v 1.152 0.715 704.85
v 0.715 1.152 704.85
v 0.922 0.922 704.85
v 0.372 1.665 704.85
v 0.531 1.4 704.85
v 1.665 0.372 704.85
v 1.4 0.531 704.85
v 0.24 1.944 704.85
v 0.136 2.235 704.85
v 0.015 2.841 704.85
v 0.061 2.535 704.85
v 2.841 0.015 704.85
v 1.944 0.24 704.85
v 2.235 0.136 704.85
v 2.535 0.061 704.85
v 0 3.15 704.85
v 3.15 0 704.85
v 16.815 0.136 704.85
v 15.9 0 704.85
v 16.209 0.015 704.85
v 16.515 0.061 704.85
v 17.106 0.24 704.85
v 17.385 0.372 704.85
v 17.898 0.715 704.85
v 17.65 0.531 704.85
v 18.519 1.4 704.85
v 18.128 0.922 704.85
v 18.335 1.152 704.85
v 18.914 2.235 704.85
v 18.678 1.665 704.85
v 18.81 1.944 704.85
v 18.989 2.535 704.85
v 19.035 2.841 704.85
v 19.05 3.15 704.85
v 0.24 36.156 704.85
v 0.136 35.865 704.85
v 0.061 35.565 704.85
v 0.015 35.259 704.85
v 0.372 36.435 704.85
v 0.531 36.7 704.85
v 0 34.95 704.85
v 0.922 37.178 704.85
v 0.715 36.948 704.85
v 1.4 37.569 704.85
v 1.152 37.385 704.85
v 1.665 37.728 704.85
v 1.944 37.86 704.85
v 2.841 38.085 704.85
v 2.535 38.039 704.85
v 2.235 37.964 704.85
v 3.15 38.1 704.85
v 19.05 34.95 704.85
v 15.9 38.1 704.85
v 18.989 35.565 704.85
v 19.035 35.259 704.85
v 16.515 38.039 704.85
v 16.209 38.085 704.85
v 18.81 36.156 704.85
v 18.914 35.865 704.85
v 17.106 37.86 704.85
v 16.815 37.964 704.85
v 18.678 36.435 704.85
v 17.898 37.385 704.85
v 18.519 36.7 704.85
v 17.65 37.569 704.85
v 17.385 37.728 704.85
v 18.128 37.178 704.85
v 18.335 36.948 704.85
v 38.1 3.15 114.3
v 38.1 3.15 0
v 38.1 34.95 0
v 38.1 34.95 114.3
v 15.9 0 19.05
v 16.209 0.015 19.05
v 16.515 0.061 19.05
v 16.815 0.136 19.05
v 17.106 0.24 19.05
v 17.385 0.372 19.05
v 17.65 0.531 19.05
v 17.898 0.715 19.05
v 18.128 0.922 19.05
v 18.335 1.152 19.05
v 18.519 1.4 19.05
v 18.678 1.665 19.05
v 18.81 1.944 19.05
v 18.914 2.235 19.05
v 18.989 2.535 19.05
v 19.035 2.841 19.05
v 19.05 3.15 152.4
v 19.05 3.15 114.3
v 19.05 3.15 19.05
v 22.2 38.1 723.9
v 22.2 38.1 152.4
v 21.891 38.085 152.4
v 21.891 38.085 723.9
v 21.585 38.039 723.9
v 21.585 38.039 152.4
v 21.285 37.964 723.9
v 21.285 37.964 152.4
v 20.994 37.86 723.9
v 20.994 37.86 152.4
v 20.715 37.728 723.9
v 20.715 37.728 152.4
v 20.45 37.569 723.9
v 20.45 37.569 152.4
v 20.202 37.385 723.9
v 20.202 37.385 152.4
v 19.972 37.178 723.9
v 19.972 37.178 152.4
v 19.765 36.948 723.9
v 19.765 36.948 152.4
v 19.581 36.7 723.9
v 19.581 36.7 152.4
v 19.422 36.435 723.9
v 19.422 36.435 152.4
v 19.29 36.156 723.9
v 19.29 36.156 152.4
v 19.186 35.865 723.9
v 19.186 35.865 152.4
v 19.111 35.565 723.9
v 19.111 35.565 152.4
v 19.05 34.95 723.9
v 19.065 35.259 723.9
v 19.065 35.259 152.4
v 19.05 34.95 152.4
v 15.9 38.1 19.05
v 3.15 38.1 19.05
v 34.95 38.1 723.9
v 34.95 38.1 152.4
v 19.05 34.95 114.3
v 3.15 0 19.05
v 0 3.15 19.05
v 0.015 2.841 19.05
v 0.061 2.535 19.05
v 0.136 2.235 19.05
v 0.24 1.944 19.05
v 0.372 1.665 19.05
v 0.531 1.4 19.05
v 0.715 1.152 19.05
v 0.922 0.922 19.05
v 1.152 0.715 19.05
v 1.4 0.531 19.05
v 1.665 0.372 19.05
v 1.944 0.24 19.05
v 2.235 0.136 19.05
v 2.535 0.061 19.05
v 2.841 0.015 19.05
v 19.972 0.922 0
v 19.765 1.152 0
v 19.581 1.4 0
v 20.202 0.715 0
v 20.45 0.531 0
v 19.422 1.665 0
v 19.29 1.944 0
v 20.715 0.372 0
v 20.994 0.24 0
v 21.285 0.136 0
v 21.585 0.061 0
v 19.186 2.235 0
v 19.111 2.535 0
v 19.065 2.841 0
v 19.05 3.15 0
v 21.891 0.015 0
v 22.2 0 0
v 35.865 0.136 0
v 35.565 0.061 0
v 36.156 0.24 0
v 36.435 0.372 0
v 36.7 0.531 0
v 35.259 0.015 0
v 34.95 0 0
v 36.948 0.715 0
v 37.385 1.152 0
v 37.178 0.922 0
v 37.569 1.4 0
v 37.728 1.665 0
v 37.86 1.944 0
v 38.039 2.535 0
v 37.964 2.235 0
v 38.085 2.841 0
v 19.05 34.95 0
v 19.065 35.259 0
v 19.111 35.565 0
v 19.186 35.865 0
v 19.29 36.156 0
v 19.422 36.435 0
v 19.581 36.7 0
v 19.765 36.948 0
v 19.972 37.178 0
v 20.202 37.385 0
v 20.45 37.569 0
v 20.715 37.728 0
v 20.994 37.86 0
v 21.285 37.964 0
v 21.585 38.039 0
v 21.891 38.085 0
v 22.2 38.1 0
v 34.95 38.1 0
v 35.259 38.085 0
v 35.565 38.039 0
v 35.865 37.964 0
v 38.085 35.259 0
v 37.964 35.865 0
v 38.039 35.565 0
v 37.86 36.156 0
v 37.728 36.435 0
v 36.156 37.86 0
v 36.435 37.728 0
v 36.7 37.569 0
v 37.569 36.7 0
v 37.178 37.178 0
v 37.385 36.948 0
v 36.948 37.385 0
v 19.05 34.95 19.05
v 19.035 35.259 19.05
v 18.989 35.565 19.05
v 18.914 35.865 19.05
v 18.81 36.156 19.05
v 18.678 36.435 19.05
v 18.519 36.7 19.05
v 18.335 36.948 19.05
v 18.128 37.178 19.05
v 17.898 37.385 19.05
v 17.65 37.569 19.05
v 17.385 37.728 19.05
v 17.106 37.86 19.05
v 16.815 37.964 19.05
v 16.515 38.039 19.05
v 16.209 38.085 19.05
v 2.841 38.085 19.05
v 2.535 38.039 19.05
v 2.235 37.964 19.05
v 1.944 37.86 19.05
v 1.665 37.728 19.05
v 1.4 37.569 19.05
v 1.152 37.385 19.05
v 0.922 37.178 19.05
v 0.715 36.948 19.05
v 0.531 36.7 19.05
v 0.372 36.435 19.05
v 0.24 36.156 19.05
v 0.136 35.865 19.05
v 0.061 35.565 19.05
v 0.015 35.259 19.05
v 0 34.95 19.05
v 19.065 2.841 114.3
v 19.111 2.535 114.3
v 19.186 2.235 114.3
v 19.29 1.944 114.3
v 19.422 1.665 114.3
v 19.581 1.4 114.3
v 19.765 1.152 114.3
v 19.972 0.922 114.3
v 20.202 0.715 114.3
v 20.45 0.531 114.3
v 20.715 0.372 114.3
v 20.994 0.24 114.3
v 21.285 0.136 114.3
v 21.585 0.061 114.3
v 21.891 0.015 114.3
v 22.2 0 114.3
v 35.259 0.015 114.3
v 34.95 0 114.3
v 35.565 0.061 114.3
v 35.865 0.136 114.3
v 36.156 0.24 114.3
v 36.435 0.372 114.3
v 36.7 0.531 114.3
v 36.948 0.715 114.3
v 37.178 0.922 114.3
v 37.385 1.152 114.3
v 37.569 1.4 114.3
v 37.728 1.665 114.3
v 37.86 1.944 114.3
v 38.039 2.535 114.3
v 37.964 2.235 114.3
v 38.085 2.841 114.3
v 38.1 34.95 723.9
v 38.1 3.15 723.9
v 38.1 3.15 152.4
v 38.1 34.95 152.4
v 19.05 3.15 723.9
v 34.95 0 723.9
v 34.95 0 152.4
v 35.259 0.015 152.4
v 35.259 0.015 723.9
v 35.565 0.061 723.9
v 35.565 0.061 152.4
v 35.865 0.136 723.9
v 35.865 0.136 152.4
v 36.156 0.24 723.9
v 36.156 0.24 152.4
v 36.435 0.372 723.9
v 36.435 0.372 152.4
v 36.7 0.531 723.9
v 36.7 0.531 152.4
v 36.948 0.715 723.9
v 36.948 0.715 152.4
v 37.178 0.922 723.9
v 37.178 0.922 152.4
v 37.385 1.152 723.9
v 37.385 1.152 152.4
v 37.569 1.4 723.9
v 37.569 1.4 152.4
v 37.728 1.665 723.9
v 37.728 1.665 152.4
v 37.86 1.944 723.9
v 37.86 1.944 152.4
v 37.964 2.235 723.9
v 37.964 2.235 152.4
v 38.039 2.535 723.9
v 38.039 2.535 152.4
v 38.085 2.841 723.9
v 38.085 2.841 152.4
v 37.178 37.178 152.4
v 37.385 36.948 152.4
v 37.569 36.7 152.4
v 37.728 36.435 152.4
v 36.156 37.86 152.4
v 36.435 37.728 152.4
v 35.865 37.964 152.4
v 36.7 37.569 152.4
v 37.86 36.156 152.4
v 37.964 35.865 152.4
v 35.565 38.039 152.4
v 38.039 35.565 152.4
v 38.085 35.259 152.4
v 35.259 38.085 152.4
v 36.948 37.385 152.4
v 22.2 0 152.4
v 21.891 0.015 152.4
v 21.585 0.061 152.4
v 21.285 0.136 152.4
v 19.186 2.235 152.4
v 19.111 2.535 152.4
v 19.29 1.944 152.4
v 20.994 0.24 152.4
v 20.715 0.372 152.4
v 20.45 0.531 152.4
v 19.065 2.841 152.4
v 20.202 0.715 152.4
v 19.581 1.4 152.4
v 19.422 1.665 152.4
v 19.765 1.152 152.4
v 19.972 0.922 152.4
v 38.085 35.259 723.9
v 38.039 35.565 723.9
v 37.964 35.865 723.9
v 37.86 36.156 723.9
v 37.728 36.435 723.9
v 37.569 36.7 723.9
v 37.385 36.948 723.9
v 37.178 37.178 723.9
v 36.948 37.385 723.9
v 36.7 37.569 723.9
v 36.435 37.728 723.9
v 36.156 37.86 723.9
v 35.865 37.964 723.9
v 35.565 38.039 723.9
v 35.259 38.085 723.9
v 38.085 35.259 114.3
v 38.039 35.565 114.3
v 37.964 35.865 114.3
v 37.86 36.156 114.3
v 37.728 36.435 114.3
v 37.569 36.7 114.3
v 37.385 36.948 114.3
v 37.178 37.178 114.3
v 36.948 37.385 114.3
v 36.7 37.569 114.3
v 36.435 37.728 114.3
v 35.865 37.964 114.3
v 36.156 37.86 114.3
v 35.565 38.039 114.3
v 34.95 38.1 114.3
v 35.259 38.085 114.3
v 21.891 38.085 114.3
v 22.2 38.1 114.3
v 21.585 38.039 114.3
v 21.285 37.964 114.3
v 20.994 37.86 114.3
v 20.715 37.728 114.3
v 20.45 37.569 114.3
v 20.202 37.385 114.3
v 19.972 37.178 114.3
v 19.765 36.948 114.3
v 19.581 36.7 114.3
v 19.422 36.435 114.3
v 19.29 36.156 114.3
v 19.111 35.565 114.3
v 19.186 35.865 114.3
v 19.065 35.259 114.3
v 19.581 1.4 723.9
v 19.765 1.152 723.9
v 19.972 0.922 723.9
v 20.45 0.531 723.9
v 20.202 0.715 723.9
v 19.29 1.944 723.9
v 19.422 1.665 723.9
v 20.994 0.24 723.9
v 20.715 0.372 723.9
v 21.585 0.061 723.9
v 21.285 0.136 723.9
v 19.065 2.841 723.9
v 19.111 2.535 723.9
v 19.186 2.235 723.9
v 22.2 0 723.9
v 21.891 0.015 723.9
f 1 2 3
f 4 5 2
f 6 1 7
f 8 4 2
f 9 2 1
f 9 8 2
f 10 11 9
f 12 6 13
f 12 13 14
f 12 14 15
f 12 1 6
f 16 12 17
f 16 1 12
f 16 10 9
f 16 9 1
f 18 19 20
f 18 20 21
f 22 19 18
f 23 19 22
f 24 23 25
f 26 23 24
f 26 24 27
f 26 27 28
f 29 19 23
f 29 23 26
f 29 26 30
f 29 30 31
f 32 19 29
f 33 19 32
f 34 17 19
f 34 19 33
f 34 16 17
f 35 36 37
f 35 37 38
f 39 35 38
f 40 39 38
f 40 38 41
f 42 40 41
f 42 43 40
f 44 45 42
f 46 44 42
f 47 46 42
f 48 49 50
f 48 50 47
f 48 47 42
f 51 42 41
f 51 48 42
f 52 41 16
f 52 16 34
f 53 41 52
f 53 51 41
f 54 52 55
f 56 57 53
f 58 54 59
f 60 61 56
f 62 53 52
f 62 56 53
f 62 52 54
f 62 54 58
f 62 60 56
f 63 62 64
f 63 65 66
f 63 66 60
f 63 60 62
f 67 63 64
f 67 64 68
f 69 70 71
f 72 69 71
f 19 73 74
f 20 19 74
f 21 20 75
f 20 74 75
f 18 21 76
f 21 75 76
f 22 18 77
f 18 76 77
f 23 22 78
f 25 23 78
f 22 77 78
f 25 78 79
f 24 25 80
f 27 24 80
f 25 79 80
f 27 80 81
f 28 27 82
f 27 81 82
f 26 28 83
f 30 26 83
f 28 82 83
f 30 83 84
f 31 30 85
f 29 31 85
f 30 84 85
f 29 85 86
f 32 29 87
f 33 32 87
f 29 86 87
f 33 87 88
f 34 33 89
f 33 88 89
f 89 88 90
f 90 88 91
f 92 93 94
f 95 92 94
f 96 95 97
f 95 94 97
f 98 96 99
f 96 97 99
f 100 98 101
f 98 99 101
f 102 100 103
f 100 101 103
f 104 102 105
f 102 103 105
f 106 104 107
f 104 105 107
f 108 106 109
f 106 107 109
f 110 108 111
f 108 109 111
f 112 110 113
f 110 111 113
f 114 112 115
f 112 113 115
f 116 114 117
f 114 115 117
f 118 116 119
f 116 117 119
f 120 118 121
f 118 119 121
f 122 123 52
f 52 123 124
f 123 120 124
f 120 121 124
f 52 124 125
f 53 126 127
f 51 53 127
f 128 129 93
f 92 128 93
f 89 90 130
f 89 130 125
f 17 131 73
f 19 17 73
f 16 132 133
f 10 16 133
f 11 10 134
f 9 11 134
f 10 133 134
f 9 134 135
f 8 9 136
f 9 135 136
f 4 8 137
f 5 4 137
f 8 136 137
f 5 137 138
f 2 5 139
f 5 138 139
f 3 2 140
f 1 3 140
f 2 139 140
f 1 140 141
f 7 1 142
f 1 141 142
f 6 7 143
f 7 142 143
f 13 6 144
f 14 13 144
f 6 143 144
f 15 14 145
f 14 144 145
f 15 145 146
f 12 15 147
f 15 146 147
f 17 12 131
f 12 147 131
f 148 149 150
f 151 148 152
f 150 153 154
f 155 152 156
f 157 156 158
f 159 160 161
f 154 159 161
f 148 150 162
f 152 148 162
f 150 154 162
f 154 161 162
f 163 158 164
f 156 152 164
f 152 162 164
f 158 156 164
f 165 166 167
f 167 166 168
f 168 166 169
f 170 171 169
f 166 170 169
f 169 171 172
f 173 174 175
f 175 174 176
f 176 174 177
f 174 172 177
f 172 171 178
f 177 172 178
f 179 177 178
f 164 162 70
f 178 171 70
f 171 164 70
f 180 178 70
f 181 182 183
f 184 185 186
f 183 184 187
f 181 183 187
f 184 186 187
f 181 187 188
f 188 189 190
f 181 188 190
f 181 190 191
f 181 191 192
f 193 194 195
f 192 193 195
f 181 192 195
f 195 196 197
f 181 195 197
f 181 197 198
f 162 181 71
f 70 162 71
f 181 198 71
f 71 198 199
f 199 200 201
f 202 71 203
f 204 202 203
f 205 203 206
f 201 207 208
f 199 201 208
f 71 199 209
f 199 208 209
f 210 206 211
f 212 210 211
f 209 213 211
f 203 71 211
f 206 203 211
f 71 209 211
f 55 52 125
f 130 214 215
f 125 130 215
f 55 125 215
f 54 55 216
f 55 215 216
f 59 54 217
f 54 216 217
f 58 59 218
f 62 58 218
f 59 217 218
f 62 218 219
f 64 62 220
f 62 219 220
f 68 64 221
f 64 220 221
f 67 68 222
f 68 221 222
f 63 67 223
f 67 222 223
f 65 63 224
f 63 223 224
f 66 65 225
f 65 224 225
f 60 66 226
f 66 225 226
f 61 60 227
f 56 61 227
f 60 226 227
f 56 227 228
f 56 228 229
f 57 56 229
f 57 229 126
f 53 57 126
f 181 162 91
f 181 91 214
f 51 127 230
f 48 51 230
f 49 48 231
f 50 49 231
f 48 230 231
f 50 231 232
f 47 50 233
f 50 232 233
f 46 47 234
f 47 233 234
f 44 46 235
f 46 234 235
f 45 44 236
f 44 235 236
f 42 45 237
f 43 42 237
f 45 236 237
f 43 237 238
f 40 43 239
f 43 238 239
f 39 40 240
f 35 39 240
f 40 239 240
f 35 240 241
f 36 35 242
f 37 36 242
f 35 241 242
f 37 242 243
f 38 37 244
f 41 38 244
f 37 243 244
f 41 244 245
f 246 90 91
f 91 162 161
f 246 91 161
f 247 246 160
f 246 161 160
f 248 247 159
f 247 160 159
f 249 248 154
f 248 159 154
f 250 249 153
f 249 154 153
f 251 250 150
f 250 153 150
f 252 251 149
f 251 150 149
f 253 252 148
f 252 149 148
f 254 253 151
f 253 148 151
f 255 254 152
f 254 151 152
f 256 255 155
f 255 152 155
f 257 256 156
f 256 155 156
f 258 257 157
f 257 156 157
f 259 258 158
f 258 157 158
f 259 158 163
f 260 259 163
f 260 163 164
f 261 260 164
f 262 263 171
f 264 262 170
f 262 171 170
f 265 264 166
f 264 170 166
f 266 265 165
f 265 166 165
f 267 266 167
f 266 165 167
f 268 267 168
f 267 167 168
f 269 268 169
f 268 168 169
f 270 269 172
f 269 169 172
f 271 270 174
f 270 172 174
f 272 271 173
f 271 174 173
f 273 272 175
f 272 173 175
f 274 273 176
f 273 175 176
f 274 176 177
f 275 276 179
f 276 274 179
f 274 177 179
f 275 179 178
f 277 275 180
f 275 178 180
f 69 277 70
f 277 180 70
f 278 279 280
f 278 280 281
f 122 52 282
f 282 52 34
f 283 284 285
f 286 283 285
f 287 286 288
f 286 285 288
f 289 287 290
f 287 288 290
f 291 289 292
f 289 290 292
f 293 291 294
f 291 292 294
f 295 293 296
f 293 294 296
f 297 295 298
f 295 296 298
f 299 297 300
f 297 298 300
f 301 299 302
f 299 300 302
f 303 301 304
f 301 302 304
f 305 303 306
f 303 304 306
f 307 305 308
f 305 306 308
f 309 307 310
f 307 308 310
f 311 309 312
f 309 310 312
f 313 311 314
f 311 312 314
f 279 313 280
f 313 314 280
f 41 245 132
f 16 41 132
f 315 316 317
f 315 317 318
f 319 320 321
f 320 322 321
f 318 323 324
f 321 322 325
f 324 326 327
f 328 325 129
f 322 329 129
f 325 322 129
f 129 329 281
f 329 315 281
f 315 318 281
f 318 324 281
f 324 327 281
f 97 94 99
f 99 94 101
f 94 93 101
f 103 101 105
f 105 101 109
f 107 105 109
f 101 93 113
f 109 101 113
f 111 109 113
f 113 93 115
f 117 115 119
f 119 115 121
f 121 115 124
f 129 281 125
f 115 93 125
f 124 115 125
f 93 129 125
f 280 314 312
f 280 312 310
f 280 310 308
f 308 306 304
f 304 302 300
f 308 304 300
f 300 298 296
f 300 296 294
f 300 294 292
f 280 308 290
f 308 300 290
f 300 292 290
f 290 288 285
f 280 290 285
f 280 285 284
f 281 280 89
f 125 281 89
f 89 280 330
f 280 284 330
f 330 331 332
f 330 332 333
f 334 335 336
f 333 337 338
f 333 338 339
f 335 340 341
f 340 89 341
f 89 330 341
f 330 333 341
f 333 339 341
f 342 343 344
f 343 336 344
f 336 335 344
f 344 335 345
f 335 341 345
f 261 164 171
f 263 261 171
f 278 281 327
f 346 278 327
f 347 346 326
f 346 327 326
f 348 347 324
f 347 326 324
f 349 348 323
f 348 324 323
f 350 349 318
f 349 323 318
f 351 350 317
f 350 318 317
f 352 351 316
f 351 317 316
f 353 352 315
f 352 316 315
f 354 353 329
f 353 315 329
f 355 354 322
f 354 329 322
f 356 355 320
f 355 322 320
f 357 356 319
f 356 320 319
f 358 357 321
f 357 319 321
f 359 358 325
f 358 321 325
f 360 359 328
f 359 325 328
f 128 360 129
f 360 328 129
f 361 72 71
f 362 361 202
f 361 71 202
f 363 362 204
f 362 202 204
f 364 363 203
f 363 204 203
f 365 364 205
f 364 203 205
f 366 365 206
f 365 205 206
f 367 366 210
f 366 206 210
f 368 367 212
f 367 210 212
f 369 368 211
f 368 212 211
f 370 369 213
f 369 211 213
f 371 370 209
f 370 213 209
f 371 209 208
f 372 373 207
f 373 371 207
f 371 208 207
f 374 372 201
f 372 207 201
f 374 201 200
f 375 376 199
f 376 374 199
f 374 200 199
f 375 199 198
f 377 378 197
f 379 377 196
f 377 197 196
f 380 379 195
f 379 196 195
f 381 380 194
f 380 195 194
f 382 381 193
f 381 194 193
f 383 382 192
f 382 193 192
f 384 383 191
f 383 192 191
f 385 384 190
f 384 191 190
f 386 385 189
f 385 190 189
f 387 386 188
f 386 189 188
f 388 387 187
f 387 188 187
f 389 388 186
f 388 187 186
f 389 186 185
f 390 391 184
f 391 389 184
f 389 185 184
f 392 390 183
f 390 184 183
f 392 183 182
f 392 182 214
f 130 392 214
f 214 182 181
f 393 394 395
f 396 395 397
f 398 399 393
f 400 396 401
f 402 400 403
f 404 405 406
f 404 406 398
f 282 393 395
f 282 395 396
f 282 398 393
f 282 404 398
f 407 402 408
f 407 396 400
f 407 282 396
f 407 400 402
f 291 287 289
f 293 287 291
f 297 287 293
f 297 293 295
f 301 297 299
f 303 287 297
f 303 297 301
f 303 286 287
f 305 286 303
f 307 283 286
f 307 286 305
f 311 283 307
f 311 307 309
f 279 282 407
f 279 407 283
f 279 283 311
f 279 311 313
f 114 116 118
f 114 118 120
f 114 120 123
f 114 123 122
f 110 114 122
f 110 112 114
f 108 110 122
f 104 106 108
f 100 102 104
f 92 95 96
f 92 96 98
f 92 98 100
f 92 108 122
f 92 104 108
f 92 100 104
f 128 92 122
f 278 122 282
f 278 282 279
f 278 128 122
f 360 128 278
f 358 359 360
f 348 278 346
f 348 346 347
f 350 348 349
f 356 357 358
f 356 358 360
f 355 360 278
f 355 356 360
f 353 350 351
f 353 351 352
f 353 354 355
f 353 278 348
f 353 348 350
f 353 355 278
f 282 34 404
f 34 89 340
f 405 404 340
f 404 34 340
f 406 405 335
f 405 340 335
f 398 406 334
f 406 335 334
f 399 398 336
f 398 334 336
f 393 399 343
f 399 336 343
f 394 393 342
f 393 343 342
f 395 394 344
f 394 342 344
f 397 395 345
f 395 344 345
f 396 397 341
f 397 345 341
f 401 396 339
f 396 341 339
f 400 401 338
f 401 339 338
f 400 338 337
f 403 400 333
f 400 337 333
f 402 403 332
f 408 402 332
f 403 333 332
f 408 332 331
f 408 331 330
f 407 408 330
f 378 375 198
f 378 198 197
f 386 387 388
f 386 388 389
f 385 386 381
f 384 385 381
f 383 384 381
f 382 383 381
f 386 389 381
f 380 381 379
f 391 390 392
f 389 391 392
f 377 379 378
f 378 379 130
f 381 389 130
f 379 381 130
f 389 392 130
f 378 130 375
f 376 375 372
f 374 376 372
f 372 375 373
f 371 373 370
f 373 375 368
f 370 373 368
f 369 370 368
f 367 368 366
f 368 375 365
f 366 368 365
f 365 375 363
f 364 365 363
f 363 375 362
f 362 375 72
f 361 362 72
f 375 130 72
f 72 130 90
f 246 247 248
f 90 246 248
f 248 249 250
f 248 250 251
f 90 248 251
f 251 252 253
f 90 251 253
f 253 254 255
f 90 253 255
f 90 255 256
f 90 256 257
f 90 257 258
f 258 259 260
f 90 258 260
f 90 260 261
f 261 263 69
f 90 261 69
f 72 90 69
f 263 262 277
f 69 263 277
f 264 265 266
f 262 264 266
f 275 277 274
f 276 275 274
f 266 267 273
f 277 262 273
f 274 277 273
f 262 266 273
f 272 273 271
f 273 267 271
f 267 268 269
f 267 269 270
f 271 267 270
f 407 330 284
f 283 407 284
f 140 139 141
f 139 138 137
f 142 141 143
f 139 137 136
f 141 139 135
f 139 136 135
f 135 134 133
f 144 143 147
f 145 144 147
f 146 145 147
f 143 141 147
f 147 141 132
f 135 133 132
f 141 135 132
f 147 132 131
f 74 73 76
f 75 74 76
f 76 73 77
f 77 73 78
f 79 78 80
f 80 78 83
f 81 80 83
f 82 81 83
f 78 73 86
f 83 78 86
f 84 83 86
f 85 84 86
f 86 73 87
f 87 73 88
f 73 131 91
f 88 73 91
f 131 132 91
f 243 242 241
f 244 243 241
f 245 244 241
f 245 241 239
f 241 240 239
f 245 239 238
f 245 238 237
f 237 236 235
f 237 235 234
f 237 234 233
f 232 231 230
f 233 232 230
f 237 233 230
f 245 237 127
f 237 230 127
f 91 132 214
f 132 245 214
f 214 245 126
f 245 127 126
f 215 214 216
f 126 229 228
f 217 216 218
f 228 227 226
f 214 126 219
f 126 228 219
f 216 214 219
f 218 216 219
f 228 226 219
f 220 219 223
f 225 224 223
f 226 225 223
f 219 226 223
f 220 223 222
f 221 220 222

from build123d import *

# Parameters (mm, degrees)
F1_DEPTH = 723.9
F2_DEPTH = 704.85
F3_DEPTH = 19.05
F4_W     = 3.1496
F4_H     = 38.1
F4_W_2   = 12.7508
F5_DEPTH = 38.101


# Not quite as in the source:
# - a feature names something its author has since deleted; it is built from what else it names


with BuildPart() as f1:
    # F0 (on Top) → F1 (new body)
    with BuildSketch(Plane.XY):
        with BuildLine():
            Line((19.05, 34.9504), (19.05, 3.1496))
            ThreePointArc((19.05, 3.1496), (19.972496482, 0.922496482), (22.1996, 0))
            Line((22.1996, 0), (34.9504, 0))
            ThreePointArc((34.9504, 0), (37.177503518, 0.922496482), (38.1, 3.1496))
            Line((38.1, 3.1496), (38.1, 34.9504))
            ThreePointArc((38.1, 34.9504), (37.177503518, 37.177503518), (34.9504, 38.1))
            Line((34.9504, 38.1), (22.1996, 38.1))
            ThreePointArc((22.1996, 38.1), (19.972496482, 37.177503518), (19.05, 34.9504))
        make_face()
    extrude(amount=F1_DEPTH)

    # F0 (on Top) → F2 (join)
    with BuildSketch(Plane.XY):
        with BuildLine():
            ThreePointArc((0, 3.1496), (0.922496482, 0.922496482), (3.1496, 0))
            Line((3.1496, 0), (15.9004, 0))
            ThreePointArc((15.9004, 0), (18.127503518, 0.922496482), (19.05, 3.1496))
            Line((19.05, 3.1496), (19.05, 34.9504))
            ThreePointArc((19.05, 34.9504), (18.127503518, 37.177503518), (15.9004, 38.1))
            Line((15.9004, 38.1), (3.1496, 38.1))
            ThreePointArc((3.1496, 38.1), (0.922496482, 37.177503518), (0, 34.9504))
            Line((0, 34.9504), (0, 3.1496))
        make_face()
        with BuildLine():
            Line((19.05, 34.9504), (19.05, 3.1496))
            ThreePointArc((19.05, 3.1496), (19.972496482, 0.922496482), (22.1996, 0))
            Line((22.1996, 0), (34.9504, 0))
            ThreePointArc((34.9504, 0), (37.177503518, 0.922496482), (38.1, 3.1496))
            Line((38.1, 3.1496), (38.1, 34.9504))
            ThreePointArc((38.1, 34.9504), (37.177503518, 37.177503518), (34.9504, 38.1))
            Line((34.9504, 38.1), (22.1996, 38.1))
            ThreePointArc((22.1996, 38.1), (19.972496482, 37.177503518), (19.05, 34.9504))
        make_face()
    extrude(amount=F2_DEPTH)

    # F0 (on Top) → F3 (cut)
    with BuildSketch(Plane.XY):
        with BuildLine():
            ThreePointArc((0, 3.1496), (0.922496482, 0.922496482), (3.1496, 0))
            Line((3.1496, 0), (15.9004, 0))
            ThreePointArc((15.9004, 0), (18.127503518, 0.922496482), (19.05, 3.1496))
            Line((19.05, 3.1496), (19.05, 34.9504))
            ThreePointArc((19.05, 34.9504), (18.127503518, 37.177503518), (15.9004, 38.1))
            Line((15.9004, 38.1), (3.1496, 38.1))
            ThreePointArc((3.1496, 38.1), (0.922496482, 37.177503518), (0, 34.9504))
            Line((0, 34.9504), (0, 3.1496))
        make_face()
    extrude(amount=F3_DEPTH, mode=Mode.SUBTRACT)

    # F4 (on face) → F5 (cut, through all)
    with BuildSketch(Plane.XZ):
        with Locations((36.5252, 133.35)):
            Rectangle(F4_W, F4_H)
        with Locations((28.575, 133.35)):
            Rectangle(F4_W_2, F4_H)
        with Locations((20.6248, 133.35)):
            Rectangle(F4_W, F4_H)
    extrude(amount=-F5_DEPTH, mode=Mode.SUBTRACT)


solid = f1.part
